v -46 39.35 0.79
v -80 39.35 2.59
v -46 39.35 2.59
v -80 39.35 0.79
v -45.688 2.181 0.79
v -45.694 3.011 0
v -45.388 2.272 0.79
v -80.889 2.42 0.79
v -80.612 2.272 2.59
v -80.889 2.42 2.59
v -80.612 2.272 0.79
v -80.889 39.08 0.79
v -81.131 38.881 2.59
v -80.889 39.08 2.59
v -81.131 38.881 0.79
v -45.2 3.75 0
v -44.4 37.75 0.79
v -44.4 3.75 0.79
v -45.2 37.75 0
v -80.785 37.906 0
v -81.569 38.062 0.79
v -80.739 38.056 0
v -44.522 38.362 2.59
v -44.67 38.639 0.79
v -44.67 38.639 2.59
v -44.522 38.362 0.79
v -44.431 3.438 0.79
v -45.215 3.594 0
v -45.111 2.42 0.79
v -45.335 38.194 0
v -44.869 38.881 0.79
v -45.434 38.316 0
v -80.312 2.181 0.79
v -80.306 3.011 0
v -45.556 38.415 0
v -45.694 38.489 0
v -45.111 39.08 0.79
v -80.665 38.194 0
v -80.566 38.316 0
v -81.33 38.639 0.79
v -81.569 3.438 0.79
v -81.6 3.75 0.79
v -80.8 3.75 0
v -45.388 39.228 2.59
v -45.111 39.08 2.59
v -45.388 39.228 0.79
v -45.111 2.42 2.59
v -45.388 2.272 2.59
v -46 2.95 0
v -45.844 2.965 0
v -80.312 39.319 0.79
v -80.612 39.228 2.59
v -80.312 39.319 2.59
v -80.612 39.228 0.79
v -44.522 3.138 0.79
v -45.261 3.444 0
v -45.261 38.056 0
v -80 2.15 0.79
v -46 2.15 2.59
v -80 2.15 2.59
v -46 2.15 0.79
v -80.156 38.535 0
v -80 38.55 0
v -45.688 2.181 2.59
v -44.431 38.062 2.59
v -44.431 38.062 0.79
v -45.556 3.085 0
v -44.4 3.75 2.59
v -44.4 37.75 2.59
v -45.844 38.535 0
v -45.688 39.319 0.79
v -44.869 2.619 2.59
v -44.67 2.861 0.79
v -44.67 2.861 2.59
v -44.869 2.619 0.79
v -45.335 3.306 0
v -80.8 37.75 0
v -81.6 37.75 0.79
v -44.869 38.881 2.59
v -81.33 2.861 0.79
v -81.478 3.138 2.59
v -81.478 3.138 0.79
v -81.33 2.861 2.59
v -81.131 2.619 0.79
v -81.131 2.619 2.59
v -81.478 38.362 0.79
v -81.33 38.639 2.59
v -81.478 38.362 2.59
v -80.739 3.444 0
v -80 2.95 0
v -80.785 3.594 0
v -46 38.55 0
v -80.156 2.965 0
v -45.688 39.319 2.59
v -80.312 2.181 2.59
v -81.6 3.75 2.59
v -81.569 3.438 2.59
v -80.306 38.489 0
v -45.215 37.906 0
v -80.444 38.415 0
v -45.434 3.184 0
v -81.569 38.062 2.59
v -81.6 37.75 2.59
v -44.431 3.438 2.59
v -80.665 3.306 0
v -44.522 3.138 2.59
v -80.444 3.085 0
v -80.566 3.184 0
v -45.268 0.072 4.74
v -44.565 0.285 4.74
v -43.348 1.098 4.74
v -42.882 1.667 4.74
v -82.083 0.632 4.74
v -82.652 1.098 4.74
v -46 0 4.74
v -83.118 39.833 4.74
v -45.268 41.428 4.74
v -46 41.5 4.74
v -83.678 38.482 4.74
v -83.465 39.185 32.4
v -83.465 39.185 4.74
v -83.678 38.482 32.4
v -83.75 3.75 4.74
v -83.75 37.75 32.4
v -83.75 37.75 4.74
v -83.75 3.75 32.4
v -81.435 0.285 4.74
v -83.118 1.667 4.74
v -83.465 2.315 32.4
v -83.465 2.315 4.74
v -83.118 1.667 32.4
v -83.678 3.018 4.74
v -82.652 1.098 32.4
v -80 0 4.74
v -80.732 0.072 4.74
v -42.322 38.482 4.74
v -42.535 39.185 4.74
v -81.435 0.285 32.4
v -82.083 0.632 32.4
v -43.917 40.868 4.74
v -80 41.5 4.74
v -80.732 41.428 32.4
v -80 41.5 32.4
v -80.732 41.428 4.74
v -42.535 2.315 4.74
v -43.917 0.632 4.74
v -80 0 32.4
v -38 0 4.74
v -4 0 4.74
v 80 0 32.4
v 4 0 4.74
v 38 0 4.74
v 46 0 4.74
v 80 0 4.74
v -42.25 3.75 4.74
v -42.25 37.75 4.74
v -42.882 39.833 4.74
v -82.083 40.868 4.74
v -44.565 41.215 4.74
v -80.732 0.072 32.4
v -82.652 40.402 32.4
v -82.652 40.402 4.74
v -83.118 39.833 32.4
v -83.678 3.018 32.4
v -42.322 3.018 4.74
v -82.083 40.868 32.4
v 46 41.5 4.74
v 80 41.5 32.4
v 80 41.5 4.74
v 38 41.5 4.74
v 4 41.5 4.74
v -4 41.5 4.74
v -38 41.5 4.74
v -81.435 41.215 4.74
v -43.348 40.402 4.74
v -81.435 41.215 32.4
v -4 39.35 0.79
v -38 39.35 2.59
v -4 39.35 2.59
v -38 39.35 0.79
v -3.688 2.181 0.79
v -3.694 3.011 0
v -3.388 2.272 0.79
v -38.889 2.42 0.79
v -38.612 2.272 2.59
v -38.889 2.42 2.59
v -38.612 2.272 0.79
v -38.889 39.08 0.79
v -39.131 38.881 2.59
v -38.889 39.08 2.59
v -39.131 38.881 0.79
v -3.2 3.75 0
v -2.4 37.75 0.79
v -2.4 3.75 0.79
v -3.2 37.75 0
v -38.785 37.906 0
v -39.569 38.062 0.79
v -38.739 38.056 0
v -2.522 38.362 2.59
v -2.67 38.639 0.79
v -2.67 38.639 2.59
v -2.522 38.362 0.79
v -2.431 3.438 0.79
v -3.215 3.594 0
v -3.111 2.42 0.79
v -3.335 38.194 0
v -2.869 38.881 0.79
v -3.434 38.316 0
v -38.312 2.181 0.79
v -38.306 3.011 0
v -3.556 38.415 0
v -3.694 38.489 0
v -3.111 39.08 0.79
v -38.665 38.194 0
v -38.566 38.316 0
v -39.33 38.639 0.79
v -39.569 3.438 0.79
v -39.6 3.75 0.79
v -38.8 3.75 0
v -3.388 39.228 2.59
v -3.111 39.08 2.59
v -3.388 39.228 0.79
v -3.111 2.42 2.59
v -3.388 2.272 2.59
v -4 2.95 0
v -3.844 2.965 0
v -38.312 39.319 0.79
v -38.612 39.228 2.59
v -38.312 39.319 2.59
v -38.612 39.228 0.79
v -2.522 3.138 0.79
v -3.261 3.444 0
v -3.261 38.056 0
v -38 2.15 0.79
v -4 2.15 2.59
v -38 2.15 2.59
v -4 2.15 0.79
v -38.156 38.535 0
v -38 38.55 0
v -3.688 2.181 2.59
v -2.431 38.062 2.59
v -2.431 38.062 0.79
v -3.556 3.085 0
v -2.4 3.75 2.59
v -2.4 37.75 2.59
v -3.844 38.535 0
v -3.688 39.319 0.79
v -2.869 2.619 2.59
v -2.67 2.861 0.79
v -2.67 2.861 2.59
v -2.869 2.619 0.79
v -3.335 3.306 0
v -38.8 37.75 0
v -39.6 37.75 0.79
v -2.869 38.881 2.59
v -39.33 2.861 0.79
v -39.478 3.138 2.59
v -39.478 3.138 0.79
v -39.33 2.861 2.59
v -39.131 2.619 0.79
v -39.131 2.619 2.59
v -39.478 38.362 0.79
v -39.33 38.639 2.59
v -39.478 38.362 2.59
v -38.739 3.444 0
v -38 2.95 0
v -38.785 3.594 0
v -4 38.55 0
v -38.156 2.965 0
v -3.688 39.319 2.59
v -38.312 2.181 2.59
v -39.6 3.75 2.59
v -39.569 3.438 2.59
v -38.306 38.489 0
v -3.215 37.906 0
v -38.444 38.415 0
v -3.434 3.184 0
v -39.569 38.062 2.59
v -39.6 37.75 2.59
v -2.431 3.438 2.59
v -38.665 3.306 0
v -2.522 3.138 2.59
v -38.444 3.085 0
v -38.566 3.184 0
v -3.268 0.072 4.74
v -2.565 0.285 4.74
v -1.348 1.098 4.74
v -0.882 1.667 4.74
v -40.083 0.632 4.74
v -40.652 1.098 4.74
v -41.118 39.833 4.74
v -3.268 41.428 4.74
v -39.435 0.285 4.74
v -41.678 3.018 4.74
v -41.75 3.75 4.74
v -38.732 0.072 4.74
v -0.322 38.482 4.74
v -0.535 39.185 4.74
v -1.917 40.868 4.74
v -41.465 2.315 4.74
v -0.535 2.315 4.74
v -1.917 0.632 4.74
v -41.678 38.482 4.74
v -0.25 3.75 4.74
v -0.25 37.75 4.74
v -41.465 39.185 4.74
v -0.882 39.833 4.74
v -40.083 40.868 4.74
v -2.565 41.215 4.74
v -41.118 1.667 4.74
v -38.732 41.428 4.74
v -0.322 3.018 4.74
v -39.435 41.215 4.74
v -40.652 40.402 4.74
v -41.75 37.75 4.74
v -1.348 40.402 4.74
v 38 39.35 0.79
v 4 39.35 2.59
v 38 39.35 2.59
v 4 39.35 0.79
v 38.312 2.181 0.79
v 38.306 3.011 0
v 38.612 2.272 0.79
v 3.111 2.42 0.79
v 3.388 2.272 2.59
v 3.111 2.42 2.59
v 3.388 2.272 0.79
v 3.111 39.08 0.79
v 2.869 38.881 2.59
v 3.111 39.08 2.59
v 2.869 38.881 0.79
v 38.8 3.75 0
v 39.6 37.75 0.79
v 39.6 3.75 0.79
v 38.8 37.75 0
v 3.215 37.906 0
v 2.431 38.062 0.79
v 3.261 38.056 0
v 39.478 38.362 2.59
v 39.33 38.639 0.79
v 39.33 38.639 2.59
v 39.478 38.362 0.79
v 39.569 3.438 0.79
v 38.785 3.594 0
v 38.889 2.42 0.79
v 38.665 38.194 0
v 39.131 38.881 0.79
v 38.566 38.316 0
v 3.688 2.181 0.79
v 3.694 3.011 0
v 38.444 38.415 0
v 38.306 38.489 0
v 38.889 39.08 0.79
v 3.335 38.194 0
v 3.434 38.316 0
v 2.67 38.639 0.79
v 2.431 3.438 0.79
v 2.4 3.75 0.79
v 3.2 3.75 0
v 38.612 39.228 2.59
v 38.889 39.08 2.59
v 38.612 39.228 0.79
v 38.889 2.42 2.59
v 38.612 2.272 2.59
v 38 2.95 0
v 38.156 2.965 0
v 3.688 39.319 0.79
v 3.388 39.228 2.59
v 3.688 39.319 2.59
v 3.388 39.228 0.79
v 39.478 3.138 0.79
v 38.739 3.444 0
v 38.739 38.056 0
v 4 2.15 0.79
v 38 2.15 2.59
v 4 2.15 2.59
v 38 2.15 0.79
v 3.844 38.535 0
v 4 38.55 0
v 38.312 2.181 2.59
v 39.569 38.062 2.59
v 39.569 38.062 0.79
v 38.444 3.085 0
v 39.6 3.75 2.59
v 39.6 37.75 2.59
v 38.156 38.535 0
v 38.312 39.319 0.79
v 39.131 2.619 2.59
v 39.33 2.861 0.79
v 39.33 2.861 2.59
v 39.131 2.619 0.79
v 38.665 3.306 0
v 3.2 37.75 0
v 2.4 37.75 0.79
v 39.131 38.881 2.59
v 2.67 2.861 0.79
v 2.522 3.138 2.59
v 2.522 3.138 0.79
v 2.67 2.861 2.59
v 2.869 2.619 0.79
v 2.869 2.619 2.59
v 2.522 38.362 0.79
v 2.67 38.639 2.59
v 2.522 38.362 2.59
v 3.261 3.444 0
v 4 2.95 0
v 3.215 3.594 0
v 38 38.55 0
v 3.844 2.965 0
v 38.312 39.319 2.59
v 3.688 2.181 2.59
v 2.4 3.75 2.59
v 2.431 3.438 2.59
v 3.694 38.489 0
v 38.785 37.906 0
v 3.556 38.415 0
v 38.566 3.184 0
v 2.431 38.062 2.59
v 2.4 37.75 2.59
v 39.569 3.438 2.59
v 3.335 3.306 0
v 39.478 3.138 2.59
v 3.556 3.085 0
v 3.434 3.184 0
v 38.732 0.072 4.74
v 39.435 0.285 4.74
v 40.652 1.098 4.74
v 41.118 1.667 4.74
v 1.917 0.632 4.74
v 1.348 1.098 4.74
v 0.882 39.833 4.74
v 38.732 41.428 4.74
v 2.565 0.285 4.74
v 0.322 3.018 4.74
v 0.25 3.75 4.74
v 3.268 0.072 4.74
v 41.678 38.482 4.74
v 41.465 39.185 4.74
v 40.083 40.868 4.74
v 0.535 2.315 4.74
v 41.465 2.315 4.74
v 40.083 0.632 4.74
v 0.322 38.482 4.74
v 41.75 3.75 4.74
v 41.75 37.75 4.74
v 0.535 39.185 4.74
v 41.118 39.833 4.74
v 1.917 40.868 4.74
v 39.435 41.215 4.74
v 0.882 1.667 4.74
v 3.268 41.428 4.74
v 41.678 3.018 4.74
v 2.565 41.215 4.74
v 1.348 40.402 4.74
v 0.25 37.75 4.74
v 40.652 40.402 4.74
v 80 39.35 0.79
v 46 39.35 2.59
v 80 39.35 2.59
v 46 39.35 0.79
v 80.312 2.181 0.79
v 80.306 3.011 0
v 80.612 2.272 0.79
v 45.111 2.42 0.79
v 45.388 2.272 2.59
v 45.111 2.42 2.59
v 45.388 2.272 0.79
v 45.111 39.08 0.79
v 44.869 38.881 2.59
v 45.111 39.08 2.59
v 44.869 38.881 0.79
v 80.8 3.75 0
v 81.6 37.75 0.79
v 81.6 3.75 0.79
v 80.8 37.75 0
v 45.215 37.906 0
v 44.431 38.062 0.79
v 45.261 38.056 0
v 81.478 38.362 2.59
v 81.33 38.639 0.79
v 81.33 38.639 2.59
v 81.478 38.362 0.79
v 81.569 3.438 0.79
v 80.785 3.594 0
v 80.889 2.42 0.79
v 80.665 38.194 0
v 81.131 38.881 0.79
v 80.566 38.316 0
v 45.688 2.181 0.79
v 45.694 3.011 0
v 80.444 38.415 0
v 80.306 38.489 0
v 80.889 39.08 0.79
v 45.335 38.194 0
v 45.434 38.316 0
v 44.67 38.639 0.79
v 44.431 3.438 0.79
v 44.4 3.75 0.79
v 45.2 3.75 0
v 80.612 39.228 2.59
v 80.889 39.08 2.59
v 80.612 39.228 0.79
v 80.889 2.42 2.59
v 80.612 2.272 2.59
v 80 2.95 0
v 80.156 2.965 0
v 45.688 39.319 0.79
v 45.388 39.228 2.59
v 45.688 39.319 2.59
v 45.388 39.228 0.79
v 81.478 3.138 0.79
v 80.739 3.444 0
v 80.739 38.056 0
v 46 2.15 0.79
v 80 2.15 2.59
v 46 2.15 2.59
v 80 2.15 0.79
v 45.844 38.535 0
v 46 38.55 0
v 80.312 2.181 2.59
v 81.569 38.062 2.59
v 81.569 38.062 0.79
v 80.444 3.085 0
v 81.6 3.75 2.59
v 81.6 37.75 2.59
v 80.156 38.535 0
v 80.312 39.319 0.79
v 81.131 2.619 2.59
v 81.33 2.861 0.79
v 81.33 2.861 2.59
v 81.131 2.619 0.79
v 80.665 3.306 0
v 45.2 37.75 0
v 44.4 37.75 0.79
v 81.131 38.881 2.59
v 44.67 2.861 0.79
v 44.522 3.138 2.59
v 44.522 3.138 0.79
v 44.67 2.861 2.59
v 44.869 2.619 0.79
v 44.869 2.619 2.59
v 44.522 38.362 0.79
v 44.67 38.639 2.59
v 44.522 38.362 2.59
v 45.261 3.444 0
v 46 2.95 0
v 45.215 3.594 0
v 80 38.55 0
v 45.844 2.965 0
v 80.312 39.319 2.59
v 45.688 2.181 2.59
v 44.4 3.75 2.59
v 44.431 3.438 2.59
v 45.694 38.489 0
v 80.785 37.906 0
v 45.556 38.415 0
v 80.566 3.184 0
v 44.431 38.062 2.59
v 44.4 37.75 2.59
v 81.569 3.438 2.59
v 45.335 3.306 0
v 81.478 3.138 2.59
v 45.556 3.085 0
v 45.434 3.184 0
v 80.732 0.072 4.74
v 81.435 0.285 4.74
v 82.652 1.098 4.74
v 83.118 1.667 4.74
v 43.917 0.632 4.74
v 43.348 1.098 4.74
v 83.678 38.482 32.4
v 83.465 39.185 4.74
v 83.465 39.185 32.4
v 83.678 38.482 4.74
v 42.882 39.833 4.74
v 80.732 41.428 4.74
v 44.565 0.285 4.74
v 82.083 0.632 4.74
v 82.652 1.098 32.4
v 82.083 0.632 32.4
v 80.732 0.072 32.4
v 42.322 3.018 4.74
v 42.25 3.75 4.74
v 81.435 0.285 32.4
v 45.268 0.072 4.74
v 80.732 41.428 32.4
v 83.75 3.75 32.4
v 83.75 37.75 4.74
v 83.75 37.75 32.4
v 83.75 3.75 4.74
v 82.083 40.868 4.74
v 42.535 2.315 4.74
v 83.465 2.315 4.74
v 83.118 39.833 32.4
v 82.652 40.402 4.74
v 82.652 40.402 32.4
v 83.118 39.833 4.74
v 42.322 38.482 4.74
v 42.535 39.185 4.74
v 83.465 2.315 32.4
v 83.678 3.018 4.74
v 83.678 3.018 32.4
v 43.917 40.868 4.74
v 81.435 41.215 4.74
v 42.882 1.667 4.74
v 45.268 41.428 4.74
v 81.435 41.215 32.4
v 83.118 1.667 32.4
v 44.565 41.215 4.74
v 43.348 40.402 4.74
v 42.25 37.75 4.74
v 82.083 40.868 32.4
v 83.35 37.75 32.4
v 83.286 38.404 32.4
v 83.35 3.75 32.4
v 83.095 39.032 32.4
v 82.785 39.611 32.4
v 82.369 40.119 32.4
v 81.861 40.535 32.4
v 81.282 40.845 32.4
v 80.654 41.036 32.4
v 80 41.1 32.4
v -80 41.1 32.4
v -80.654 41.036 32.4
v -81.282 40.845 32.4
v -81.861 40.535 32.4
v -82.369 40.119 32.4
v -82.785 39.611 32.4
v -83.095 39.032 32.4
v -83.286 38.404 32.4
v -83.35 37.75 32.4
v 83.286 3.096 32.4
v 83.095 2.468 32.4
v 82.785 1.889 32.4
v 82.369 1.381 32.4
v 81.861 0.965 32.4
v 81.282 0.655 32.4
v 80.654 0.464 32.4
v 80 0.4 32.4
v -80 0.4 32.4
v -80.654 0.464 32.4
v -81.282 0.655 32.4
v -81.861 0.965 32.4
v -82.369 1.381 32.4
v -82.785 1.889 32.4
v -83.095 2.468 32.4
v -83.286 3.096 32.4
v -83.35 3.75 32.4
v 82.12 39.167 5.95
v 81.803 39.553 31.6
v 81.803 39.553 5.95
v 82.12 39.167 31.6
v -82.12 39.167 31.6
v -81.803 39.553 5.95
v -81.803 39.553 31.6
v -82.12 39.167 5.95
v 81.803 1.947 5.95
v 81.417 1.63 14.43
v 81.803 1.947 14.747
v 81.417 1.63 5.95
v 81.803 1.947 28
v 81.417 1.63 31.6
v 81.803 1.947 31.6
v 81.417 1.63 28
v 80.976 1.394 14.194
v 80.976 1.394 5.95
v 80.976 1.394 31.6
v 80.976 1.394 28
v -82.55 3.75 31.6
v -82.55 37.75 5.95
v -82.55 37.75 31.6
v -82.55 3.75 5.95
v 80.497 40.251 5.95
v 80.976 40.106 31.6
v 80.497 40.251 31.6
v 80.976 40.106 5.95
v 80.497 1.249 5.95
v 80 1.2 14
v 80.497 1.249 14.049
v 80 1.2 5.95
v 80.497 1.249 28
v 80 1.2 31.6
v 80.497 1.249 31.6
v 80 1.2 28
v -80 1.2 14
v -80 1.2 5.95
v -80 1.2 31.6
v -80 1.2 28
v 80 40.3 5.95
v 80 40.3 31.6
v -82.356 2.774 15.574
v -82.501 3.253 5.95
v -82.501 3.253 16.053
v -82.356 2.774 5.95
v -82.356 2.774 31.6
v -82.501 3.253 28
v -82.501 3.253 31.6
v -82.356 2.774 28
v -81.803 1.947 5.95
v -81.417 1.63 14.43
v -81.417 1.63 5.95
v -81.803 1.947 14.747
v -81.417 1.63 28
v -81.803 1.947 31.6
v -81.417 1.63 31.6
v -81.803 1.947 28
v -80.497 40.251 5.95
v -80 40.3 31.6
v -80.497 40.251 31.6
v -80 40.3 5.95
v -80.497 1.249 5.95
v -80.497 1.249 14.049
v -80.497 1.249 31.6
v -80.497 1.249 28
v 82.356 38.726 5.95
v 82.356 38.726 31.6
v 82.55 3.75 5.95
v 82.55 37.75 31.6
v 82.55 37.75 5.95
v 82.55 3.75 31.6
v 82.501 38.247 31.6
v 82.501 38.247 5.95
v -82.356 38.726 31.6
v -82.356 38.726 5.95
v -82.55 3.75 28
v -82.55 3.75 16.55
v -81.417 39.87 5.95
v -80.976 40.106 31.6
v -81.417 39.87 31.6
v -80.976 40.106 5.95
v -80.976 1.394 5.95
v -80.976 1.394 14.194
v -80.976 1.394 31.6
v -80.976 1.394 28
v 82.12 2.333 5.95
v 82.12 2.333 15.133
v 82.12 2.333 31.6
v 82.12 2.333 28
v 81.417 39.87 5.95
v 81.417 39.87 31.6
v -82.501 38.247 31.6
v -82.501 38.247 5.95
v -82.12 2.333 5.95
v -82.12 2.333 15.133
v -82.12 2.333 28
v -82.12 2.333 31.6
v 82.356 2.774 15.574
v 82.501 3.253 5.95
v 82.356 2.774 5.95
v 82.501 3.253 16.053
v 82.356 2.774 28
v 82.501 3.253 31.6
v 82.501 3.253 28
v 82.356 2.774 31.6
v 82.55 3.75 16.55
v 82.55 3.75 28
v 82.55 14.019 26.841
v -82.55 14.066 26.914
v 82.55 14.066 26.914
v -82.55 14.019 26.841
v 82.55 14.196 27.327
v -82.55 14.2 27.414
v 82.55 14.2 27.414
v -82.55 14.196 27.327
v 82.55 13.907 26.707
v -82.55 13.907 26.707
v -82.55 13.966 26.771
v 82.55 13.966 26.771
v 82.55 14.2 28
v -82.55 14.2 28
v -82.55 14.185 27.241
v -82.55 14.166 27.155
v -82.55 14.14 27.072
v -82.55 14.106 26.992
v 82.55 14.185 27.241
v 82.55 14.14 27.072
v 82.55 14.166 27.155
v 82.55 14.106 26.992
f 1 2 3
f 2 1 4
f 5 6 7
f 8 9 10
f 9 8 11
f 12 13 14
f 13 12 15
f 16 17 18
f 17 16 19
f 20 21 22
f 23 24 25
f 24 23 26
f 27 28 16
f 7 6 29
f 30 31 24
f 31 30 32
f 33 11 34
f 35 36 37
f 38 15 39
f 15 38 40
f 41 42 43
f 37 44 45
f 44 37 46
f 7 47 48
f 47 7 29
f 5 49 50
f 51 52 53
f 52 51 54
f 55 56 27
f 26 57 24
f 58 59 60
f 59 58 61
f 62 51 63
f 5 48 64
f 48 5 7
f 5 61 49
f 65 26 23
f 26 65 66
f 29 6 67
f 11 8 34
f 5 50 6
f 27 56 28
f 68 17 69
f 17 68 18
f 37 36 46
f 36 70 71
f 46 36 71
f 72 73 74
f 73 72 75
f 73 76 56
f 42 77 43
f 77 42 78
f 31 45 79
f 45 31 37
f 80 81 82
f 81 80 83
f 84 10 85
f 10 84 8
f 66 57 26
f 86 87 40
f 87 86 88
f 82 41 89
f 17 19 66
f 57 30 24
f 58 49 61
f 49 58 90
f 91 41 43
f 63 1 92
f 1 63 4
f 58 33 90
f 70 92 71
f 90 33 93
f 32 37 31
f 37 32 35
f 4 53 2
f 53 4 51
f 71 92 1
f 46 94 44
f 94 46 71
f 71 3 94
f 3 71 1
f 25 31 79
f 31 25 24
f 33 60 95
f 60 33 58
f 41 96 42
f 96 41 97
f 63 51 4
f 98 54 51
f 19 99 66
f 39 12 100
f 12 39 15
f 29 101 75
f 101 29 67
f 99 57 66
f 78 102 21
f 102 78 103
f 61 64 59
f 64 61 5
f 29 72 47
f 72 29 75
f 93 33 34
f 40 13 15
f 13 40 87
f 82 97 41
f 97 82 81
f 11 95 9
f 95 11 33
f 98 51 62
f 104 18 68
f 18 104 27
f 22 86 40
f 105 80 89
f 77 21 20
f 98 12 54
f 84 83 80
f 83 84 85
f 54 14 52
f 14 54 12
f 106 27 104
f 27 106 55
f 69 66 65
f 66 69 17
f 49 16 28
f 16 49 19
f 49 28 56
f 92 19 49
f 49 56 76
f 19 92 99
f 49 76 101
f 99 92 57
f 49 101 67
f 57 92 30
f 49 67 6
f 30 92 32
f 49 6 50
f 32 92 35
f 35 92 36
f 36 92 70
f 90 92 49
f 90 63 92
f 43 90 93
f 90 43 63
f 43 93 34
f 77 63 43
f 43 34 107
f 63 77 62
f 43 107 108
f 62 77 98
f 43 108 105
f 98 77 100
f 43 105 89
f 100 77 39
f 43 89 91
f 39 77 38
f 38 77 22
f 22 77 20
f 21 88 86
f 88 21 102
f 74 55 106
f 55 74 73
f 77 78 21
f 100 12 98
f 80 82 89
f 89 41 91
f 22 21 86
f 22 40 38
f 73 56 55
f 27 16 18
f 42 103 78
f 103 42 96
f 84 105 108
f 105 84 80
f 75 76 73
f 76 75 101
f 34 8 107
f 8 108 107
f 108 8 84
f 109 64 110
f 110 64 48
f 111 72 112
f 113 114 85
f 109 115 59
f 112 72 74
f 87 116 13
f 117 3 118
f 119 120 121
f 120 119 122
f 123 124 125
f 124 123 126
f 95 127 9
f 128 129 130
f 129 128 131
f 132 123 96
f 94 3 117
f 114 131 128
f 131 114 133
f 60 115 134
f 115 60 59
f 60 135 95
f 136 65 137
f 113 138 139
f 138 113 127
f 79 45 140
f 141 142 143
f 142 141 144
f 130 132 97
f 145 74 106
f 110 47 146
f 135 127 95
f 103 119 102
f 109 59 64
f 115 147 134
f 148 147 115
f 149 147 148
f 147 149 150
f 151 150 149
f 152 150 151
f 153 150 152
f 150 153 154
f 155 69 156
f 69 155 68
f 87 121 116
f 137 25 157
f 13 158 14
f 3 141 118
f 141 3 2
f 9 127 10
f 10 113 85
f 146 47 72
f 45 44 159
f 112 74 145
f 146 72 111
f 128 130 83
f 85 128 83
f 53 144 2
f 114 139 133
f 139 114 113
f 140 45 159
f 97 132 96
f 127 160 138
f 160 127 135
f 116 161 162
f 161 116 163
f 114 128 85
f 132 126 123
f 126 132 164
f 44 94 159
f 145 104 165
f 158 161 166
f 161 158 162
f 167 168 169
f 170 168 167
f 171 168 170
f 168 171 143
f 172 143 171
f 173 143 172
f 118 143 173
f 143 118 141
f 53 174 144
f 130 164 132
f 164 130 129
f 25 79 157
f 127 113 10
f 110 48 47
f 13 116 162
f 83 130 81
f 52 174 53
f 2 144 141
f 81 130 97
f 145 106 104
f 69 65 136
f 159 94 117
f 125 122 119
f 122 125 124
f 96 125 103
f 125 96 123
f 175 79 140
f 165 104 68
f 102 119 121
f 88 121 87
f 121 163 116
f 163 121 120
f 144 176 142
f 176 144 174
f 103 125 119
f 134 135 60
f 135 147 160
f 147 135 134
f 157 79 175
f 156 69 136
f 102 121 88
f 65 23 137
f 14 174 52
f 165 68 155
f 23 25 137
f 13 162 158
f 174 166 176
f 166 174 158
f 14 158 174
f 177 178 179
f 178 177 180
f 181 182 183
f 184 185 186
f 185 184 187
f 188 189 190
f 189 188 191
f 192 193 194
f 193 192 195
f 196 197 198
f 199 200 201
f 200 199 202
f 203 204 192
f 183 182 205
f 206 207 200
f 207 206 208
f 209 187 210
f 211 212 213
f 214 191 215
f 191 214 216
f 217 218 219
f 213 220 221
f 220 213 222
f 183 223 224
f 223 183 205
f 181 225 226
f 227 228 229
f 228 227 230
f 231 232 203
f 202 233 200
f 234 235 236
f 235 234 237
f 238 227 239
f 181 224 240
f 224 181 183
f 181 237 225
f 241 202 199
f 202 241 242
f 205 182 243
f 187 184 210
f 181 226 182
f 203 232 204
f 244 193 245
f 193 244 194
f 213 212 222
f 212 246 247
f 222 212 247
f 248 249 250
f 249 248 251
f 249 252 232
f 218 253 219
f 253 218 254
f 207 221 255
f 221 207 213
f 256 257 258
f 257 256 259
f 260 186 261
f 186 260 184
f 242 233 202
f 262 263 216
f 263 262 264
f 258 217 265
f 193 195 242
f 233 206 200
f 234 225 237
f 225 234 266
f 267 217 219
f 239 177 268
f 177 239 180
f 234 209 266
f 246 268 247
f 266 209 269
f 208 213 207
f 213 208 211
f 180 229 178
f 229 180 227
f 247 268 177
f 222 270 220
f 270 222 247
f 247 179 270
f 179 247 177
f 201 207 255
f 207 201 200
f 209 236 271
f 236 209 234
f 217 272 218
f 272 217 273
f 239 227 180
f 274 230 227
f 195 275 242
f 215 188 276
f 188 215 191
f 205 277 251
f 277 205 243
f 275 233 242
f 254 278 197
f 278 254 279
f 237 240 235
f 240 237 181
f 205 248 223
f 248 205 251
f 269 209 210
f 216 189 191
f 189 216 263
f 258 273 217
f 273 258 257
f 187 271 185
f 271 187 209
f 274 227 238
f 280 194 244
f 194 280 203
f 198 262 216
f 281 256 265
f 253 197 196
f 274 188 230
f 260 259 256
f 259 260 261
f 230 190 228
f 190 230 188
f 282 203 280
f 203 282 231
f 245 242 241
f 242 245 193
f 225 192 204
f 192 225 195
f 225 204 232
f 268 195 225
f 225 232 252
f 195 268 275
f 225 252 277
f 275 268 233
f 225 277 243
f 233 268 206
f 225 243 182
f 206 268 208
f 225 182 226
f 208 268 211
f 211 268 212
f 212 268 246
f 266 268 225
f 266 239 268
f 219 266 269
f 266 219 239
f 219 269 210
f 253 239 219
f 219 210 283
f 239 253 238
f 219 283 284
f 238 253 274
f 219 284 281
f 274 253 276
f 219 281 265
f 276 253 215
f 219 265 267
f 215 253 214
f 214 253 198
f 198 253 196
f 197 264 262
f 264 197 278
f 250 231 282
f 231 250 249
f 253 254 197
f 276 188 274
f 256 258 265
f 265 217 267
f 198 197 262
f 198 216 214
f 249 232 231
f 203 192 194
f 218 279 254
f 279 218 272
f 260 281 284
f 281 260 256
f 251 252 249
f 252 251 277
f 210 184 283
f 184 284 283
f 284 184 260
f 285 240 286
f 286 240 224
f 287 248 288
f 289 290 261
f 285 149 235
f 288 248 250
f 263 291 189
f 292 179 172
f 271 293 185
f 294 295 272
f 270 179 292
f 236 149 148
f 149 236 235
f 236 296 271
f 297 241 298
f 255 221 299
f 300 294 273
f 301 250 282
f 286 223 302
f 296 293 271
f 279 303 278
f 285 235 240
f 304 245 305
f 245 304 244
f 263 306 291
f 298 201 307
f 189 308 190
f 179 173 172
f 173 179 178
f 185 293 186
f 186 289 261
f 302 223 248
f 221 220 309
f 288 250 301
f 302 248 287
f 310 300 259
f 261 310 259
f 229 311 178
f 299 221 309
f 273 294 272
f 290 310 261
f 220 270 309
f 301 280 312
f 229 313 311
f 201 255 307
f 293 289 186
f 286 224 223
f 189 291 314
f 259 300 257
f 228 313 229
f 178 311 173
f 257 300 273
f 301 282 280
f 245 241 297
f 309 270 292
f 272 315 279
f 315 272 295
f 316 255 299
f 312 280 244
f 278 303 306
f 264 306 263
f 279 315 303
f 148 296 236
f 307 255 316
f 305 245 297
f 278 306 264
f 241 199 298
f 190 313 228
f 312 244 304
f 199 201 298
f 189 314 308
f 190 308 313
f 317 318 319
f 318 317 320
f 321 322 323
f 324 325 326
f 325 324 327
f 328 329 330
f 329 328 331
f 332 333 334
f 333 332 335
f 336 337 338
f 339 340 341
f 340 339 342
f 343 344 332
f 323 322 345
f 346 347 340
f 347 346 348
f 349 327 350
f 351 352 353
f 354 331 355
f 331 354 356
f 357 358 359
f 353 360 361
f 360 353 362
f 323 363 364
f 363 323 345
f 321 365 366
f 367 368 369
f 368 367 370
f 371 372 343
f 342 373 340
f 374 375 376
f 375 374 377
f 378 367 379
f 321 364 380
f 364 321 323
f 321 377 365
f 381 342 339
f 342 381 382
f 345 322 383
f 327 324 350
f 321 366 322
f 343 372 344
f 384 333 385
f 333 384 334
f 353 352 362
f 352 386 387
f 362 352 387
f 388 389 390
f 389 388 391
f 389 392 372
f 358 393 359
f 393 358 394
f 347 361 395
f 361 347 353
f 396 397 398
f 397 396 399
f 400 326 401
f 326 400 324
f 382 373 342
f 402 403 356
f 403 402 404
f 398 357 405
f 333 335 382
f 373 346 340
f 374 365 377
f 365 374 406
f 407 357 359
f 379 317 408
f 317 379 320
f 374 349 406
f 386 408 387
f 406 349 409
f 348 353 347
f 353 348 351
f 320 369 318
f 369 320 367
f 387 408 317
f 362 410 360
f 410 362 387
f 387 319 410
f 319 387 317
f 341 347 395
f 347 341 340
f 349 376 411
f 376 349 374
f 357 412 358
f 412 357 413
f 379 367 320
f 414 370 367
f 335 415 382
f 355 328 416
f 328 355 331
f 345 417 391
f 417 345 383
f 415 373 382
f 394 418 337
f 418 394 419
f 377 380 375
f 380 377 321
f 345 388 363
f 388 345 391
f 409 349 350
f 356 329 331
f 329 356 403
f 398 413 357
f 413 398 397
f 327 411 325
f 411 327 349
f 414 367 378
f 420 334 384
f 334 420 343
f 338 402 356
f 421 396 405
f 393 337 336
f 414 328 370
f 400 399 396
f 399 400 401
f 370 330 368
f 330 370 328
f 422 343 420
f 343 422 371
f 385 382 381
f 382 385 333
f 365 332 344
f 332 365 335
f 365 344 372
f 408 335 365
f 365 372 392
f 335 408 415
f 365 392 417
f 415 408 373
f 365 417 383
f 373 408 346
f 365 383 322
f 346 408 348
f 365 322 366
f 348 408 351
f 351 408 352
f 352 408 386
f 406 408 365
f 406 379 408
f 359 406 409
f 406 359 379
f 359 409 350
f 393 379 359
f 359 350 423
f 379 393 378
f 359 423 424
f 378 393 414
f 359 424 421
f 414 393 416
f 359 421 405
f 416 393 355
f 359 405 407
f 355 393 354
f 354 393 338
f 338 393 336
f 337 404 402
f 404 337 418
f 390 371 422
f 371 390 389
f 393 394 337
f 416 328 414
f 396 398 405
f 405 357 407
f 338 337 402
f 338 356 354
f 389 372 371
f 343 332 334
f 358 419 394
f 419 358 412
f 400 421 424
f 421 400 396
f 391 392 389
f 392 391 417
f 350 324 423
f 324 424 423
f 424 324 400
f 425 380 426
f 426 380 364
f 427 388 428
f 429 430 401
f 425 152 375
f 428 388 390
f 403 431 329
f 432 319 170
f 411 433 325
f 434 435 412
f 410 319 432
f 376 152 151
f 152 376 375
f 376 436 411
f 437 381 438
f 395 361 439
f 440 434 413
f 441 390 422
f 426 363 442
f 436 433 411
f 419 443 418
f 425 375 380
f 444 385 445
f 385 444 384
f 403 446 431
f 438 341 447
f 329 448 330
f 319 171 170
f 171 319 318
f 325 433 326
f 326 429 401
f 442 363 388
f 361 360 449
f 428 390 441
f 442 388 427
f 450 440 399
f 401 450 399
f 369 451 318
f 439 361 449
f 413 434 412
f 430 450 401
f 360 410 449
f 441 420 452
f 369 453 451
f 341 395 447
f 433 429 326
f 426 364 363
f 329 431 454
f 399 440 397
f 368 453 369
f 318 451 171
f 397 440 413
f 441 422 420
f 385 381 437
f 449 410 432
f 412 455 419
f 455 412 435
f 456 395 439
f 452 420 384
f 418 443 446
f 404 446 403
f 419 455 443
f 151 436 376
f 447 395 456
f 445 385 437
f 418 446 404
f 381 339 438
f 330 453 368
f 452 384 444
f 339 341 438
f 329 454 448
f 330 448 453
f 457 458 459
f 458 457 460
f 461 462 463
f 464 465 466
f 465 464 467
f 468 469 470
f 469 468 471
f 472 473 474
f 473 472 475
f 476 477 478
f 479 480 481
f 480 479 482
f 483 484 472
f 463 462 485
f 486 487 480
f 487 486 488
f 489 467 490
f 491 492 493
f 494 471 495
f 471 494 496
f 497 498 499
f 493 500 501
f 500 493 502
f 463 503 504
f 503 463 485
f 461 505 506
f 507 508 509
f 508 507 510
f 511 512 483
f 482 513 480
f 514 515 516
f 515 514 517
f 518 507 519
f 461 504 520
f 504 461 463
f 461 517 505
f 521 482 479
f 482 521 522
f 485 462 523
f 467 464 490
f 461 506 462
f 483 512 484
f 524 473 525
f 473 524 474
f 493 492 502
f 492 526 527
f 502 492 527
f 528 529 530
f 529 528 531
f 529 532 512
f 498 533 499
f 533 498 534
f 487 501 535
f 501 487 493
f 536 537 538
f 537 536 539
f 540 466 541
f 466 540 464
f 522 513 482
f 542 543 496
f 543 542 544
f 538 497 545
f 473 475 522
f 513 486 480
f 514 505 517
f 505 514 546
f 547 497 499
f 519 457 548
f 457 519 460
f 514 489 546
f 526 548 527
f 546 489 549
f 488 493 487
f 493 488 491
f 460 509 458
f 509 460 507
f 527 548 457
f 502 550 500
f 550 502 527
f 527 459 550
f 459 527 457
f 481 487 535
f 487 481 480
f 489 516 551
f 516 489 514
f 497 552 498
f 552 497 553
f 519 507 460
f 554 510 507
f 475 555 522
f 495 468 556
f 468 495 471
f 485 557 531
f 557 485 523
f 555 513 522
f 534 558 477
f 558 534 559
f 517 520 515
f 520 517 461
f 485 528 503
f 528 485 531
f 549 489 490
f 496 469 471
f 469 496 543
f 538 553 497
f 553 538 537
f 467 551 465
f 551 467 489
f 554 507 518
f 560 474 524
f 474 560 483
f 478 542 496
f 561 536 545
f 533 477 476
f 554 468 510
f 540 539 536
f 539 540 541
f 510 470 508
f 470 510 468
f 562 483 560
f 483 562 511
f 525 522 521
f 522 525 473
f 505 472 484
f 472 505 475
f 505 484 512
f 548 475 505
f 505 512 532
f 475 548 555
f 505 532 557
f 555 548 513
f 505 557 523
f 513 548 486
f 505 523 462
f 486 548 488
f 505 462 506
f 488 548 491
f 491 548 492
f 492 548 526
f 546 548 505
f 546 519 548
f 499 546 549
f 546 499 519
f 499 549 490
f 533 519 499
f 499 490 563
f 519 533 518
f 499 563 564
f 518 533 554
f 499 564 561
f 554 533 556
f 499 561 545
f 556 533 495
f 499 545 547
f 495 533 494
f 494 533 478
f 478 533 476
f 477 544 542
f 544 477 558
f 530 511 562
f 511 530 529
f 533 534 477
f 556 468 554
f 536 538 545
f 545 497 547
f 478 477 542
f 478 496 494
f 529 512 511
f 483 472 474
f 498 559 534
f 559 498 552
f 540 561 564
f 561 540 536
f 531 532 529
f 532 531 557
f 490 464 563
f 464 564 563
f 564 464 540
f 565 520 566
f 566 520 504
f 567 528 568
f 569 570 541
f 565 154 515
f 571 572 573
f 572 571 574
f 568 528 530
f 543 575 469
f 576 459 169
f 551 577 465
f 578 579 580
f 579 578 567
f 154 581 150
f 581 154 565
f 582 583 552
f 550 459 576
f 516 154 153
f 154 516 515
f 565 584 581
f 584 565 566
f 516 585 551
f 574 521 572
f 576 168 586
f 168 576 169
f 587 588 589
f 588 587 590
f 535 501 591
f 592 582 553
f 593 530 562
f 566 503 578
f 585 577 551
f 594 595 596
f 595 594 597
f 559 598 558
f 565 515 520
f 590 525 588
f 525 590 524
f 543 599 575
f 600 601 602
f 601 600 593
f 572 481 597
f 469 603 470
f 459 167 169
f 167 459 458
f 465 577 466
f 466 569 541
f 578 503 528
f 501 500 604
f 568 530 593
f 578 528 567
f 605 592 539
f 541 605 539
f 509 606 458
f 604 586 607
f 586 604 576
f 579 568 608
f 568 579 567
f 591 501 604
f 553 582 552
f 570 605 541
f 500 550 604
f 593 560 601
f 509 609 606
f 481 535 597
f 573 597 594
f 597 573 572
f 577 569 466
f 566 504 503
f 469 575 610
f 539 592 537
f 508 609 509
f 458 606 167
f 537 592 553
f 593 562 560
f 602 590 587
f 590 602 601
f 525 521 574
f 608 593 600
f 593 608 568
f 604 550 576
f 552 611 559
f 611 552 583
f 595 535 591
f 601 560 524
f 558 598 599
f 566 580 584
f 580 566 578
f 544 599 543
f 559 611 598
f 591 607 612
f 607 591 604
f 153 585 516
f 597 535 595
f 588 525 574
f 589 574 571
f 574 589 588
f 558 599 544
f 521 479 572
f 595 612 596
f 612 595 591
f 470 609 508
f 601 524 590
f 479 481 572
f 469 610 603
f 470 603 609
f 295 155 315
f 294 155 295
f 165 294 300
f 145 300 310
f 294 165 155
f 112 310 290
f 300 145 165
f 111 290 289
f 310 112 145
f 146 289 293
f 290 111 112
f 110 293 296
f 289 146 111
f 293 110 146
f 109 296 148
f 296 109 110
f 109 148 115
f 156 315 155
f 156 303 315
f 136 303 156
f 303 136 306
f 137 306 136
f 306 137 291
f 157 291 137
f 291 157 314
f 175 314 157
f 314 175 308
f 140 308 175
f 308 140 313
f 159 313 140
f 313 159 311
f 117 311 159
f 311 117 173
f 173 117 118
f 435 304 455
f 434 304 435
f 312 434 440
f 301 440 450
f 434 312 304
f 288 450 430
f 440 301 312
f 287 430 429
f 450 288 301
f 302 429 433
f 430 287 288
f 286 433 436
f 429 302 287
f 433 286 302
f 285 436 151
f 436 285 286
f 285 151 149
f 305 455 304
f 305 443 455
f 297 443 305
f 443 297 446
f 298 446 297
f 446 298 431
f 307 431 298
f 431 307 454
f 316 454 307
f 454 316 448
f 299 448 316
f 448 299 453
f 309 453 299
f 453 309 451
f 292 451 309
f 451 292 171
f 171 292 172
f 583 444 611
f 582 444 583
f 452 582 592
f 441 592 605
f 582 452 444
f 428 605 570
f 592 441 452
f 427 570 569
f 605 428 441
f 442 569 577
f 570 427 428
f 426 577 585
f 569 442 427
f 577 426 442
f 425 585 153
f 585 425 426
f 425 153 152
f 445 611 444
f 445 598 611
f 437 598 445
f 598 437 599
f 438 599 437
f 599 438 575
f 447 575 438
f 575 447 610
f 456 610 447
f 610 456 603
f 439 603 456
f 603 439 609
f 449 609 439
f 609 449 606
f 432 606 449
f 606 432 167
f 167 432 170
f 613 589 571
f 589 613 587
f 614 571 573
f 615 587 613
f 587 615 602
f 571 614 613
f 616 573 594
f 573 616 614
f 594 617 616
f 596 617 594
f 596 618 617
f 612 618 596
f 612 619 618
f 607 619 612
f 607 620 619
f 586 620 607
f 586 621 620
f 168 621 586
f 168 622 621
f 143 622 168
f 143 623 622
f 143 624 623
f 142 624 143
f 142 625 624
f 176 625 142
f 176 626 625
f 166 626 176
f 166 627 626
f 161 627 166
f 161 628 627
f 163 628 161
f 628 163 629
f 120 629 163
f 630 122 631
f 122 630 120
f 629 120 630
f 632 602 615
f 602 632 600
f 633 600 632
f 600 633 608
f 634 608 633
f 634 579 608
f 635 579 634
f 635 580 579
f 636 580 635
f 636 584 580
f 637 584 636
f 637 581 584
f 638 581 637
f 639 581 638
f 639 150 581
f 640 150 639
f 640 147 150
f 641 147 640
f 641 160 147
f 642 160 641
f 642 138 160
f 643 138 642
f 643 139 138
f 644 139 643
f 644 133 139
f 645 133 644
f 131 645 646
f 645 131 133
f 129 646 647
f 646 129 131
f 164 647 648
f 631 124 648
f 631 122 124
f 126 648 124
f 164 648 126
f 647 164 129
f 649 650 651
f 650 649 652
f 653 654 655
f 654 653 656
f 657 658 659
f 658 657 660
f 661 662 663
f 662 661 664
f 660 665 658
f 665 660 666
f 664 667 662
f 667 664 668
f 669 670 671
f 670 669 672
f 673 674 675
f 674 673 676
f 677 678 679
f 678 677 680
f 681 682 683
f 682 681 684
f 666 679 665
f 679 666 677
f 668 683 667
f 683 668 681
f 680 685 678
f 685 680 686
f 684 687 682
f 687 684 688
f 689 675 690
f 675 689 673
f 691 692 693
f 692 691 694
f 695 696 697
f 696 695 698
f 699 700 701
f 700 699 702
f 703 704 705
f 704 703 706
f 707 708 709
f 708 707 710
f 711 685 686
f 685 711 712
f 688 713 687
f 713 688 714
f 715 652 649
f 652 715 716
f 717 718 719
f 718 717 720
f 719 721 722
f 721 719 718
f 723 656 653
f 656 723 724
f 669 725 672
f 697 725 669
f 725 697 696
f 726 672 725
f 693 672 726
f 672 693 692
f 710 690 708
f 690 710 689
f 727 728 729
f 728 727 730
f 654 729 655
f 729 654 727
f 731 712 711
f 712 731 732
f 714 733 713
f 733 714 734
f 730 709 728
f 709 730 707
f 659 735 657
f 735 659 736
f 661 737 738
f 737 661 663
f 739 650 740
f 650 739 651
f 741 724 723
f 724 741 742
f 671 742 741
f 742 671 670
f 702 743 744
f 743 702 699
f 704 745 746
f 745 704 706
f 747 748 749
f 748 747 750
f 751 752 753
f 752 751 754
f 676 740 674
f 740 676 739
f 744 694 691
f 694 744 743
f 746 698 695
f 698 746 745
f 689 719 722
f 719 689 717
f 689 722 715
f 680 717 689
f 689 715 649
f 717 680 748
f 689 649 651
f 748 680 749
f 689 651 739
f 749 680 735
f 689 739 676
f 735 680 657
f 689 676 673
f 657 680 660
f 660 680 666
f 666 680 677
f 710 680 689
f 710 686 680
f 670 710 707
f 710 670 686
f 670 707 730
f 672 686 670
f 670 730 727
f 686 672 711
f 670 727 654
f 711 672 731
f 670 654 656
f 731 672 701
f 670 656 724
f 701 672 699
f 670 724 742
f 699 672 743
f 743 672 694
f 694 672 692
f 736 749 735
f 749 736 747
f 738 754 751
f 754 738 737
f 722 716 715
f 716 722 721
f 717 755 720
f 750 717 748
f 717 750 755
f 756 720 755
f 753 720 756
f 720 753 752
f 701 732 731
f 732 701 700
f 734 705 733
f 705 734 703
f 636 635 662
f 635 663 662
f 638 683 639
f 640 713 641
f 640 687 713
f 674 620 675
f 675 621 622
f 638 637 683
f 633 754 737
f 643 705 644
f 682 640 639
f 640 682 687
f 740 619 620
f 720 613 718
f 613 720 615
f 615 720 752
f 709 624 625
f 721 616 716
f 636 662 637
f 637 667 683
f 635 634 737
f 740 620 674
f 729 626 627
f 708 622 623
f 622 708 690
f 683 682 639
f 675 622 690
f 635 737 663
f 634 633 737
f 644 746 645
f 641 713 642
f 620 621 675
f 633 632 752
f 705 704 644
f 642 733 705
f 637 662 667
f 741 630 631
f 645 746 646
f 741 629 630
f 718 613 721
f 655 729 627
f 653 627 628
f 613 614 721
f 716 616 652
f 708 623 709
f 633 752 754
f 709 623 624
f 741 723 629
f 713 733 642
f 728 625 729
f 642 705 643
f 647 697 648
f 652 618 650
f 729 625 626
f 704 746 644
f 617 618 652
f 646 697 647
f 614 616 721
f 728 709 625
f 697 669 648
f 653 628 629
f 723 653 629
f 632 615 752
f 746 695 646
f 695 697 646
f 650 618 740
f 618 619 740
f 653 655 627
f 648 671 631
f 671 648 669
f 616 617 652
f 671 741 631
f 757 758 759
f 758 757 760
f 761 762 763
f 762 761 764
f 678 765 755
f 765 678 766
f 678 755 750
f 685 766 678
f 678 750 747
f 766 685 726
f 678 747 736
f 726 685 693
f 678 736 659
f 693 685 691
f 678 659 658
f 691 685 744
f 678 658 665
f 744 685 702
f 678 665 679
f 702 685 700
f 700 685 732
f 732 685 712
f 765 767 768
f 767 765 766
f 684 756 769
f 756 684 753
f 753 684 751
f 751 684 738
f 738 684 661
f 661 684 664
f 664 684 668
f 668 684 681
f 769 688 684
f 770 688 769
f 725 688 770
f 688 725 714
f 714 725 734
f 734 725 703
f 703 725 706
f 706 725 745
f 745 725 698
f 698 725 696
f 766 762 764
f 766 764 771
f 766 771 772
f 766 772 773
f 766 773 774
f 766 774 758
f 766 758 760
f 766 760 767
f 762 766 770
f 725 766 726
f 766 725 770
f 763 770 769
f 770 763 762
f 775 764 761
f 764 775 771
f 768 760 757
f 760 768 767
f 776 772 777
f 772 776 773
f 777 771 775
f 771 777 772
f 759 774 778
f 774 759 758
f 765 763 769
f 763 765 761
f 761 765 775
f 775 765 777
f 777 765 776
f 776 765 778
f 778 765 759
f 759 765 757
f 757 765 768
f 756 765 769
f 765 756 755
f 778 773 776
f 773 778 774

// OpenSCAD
// file: ../../modules/gridfinity.scad
// Gridfinity ベースプレートの共有 module。
// 寸法は Gridfinity 仕様 (Zack Freedman) の baseplate 輪郭に従う:
//   ピッチ 42、ソケット上端開口 41.5 (角 R4)、上から 45° 面取り 2.15 →
//   垂直 1.8 (37.2 角・R1.85) → 45° 面取り 0.7 → 底 35.8 角 (R1.15)。
//   ソケット深さ = 2.15 + 1.8 + 0.7 = 4.65。
//
// 座標系: X が列方向 (中央が 0)、Y が行方向 (板の前端が 0)、Z=0 が板の底面。
// 板の外形は grid とは独立に rim で与えるので、grid より大きい板 (縁付き) を
// 作れる。ソケットは rim=[left, right, front, back] の内側へ 42 ピッチで並ぶ。

gf_pitch = 42;
gf_socket_top = 41.5; // 上端開口
gf_socket_mid = 37.2; // 垂直部
gf_socket_bot = 35.8; // 底
gf_socket_r_top = 4;
gf_socket_r_mid = 1.85;
gf_socket_r_bot = 1.15;
gf_chamfer_top = 2.15;
gf_wall_h = 1.8;
gf_chamfer_bot = 0.7;
gf_socket_depth = gf_chamfer_top + gf_wall_h + gf_chamfer_bot; // 4.65
gf_fn = 32;
gf_eps = 0.01; // hull 用の薄板の厚さ
gf_over = 0.5; // 切削の抜き代

// 角丸正方形 (一辺 w、角 R)
module
gf_rounded_square(w, r)
{
    offset(r = r, $fn = gf_fn) square(w - 2 * r, center = true);
}

// 厚さ gf_eps の角丸正方形の薄板を z に置く (hull の骨)
module
gf_slab(w, r, z)
{
    translate([ 0, 0, z ]) linear_extrude(gf_eps) gf_rounded_square(w, r);
}

// ソケット1個の切削体。z=0 がソケットの底 (床の天面)、+Z へ 4.65 で天面に出る。
// clearance は嵌合の逃げで、輪郭を全周へ clearance だけ外へ出す (幅 +2c、角 R
// +c)。 既定 0 が Gridfinity の公称輪郭。深さとピッチは変えない
module
gf_socket_cut(clearance = 0)
{
    z1 = gf_chamfer_bot;
    z2 = z1 + gf_wall_h;
    z3 = gf_socket_depth;
    c = clearance;
    hull()
    {
        gf_slab(gf_socket_bot + 2 * c, gf_socket_r_bot + c, 0);
        gf_slab(gf_socket_mid + 2 * c, gf_socket_r_mid + c, z1 - gf_eps);
    }
    hull()
    {
        gf_slab(gf_socket_mid + 2 * c, gf_socket_r_mid + c, z1 - gf_eps);
        gf_slab(gf_socket_mid + 2 * c, gf_socket_r_mid + c, z2 - gf_eps);
    }
    hull()
    {
        gf_slab(gf_socket_mid + 2 * c, gf_socket_r_mid + c, z2 - gf_eps);
        gf_slab(gf_socket_top + 2 * c, gf_socket_r_top + c, z3 - gf_eps);
    }
    // 天面より上へ抜く (天面と同一平面の退化した面を残さない)
    gf_slab(gf_socket_top + 2 * c, gf_socket_r_top + c, z3 - gf_eps);
    translate([ 0, 0, z3 - gf_eps ]) linear_extrude(gf_over + gf_eps)
        gf_rounded_square(gf_socket_top + 2 * c, gf_socket_r_top + c);
}

// ベースプレート。cols x rows のソケットを床 floor_t の上に彫る。
// rim = [left, right, front, back] はソケット列の外側に残す縁の幅。
// 板の幅 = cols*42 + left + right、奥行き = rows*42 + front + back。
// clearance はソケットの嵌合の逃げ (gf_socket_cut を参照)。
module
gf_baseplate(cols, rows, rim = [ 0, 0, 0, 0 ], floor_t = 1, clearance = 0)
{
    grid_w = cols * gf_pitch;
    grid_d = rows * gf_pitch;
    plate_w = grid_w + rim[0] + rim[1];
    plate_d = grid_d + rim[2] + rim[3];
    x0 = -plate_w / 2 + rim[0]; // ソケット列の左端
    difference()
    {
        translate([ -plate_w / 2, 0, 0 ])
            cube([ plate_w, plate_d, floor_t + gf_socket_depth ]);
        for (c = [0:cols - 1], r = [0:rows - 1])
            translate([
                x0 + (c + 0.5) * gf_pitch,
                rim[2] + (r + 0.5) * gf_pitch,
                floor_t
            ]) gf_socket_cut(clearance);
    }
}
// file: ../../modules/gridfinity_bin.scad
include <gridfinity.scad>

// Gridfinity bin (箱) の共有 module。ピッチと角丸は gridfinity.scad
// と共有する。 底の輪郭は Gridfinity 仕様の bin base (下から):
//   35.6 角 (R0.8) → 45° 0.8 → 37.2 角 (R1.6) → 垂直 1.8 → 45° 2.15 → 41.5 角
//   (R3.75) 高さ 0.8 + 1.8 + 2.15 = 4.75。磁石穴・ネジ穴は持たない (無垢)
// 外形はピッチ − 0.5 (1 マス 41.5)、角 R3.75。高さ単位 7 (4U = 28 が壁の上端)。
// リップは「薄いリップ」: 壁 (1.2) をそのまま lip_h (4.4) 伸ばし、内側の上端を
// 45° に落とすだけ。内側に棚 (厚い肉) を持たないので、上に載せる bin は底の
// 面取りをこの 45° に座らせる。
//
// 座標系: X が列方向 (中央 0)、Y が行方向 (手前 = ラベル側が 0)、Z=0 が底面。

gfb_outer = gf_pitch - 0.5; // 41.5
gfb_outer_r = 3.75;
gfb_base_bot = 35.6;
gfb_base_bot_r = 0.8;
gfb_base_mid = 37.2;
gfb_base_mid_r = 1.6;
gfb_base_chamfer_bot = 0.8;
gfb_base_wall_h = 1.8;
gfb_base_chamfer_top = 2.15;
gfb_base_h =
    gfb_base_chamfer_bot + gfb_base_wall_h + gfb_base_chamfer_top; // 4.75
gfb_unit = 7;
gfb_lip_h = 4.4;
gfb_lip_chamfer = 0.8;

// bin 1 マスぶんの底 (無垢)。z=0 が底面、gfb_base_h で外形 41.5 角に達する
module
gfb_base_cell()
{
    z1 = gfb_base_chamfer_bot;
    z2 = z1 + gfb_base_wall_h;
    z3 = gfb_base_h;
    hull()
    {
        gf_slab(gfb_base_bot, gfb_base_bot_r, 0);
        gf_slab(gfb_base_mid, gfb_base_mid_r, z1 - gf_eps);
    }
    hull()
    {
        gf_slab(gfb_base_mid, gfb_base_mid_r, z1 - gf_eps);
        gf_slab(gfb_base_mid, gfb_base_mid_r, z2 - gf_eps);
    }
    hull()
    {
        gf_slab(gfb_base_mid, gfb_base_mid_r, z2 - gf_eps);
        gf_slab(gfb_outer, gfb_outer_r, z3 - gf_eps);
    }
}

// cols x rows の角丸矩形 (外形)
module
gfb_footprint(cols, rows, inset = 0)
{
    w = cols * gf_pitch - 0.5 - 2 * inset;
    d = rows * gf_pitch - 0.5 - 2 * inset;
    translate([ 0, d / 2 + inset ])
        gf_rounded_square_wd(w, d, gfb_outer_r - inset);
}

// 幅 w × 奥行き d の角丸矩形 (中心が原点)
module
gf_rounded_square_wd(w, d, r)
{
    offset(r = r, $fn = gf_fn) square([ w - 2 * r, d - 2 * r ], center = true);
}

// ラベル天板の Y-Z 断面 (y = 壁の内面からの距離、z = 高さ)。天板 (厚さ t) の
// 先端から 45° の斜面が壁まで下りる無垢のくさび。先端の垂直面と斜面の境目
// (135°) を半径 r で丸める: 円弧の中心は先端の角から (-r, r·tan22.5°)、接点は
// 垂直面上の角 + (0, r·tan22.5°) と斜面上の角 + 0.4142r·(-1,-1)。壁の内側へ
// 1 だけ食い込ませて胴体と溶かす
function gfb_label_profile(d, t, h, r) =
    let(y0 = d, z0 = h - t, cy = y0 - r, cz = z0 + r * tan(22.5))
        concat([ [ -1, h ], [ d, h ] ],
               [for (a = [0:-5:-45])[cy + r * cos(a), cz + r* sin(a)]],
               [[ -1, h - t - d - 1 ]]);

// bin 本体。units は高さ (U)。wall / floor_t は壁と床の厚さ。
// label_d > 0 なら手前 (y=0) の壁の上端 (z = units*7) と面一で内側へ label_d
// 張り出す厚さ label_t のラベル天板を付ける。天板の下は 45° の無垢のくさびが
// 壁まで下りる (ブリッジもリブも無い。中身はスライサのインフィル任せ)。
// 天板の先端と 45° 面の境目は半径 label_r で丸める
module
gfb_bin(cols,
        rows,
        units = 4,
        wall = 1.2,
        floor_t = 1.2,
        label_d = 0,
        label_t = 1,
        label_r = 1)
{
    h = units * gfb_unit; // 壁の上端
    top = h + gfb_lip_h;  // リップの上端
    inner_w = cols * gf_pitch - 0.5 - 2 * wall;
    floor_top = gfb_base_h + floor_t;
    union()
    {
        // 底: マスごとの無垢の base
        for (c = [0:cols - 1], r = [0:rows - 1])
            translate([
                (c - (cols - 1) / 2) * gf_pitch,
                (r + 0.5) * gf_pitch - 0.25,
                0
            ]) gfb_base_cell();
        // 胴体: base の上から top
        // まで。内側は床の上を抜く。リップの内側の上端は 45°
        difference()
        {
            translate([ 0, 0, gfb_base_h - gf_eps ])
                linear_extrude(top - gfb_base_h + gf_eps)
                    gfb_footprint(cols, rows);
            translate([ 0, 0, floor_top ])
                linear_extrude(top - floor_top + gf_over)
                    gfb_footprint(cols, rows, wall);
            // リップ内側の面取り: 上端で wall − 0.4 まで開く
            hull()
            {
                translate([ 0, 0, top - gfb_lip_chamfer ])
                    linear_extrude(gf_eps) gfb_footprint(cols, rows, wall);
                translate([ 0, 0, top ]) linear_extrude(gf_over)
                    gfb_footprint(cols, rows, wall - gfb_lip_chamfer);
            }
        }
        // ラベル天板と 45° くさび (内幅いっぱい、同じ断面)。壁へ 1 食い込ませた
        // 矩形の柱なので、角の丸み (R3.75) の外へ出ないよう外形で切り取る
        if (label_d > 0)
            intersection()
            {
                translate([ -inner_w / 2, wall, 0 ]) rotate([ 90, 0, 90 ])
                    linear_extrude(inner_w) polygon(
                        gfb_label_profile(label_d, label_t, h, label_r));
                linear_extrude(top) gfb_footprint(cols, rows);
            }
    }
}
// file: ../../modules/gridfinity_bin_4u.scad
include <gridfinity_bin.scad>

// assets/gridfinity-bin/ の bin 群の共通値と、サイズ 3 引数の払い出し口。
// 単体では何も描かない。設計の経緯と確定値は
// ledger/designs/gridfinity-bin-4u.md が正本。 保証する範囲は cols 1..5 ×
// rows 1..5 × units 4 (assets に並ぶ 25 種)。 cols が X (横)、rows が Y
// (ラベルの壁から奥へ)、units が高さ (7mm 単位)。
wall = 1.2;    // 0.4 ノズル 3 本
floor_t = 1.2; // 底 (4.75) の上に載せる床。床の天面 z = 5.95
label_d = 13;  // 12mm 幅のラベルシールを貼る天板の張り出し
label_t = 1; // 天板の厚さ (user 指定)。下は 45° の無垢のくさび
label_r = 1; // 天板の先端と 45° 面の境目の R (user 指定)

function bin_contract(cols, rows, units) = str("CONTRACT units=",
                                               units,
                                               " pitch=",
                                               gf_pitch,
                                               " outer=",
                                               gfb_outer,
                                               " h=",
                                               units* gfb_unit,
                                               " lip=",
                                               gfb_lip_h,
                                               " base=",
                                               gfb_base_bot,
                                               "/",
                                               gfb_base_mid,
                                               "/",
                                               gfb_outer,
                                               " base_h=",
                                               gfb_base_h,
                                               " wall=",
                                               wall,
                                               " floor_top=",
                                               gfb_base_h + floor_t,
                                               " label=",
                                               label_d,
                                               "x",
                                               label_t,
                                               " wedge=45 fillet=",
                                               label_r,
                                               " bin=",
                                               cols,
                                               "x",
                                               rows,
                                               " size=",
                                               cols* gf_pitch - 0.5,
                                               "x",
                                               rows* gf_pitch - 0.5);

// (cols, rows, units) でラベル付き bin を払い出す。例: gridfinity_bin(2, 4, 4)
module
gridfinity_bin(cols, rows, units = 4)
{
    echo(bin_contract(cols, rows, units));
    gfb_bin(cols, rows, units, wall, floor_t, label_d, label_t, label_r);
}
// main file
include <../../modules/gridfinity_bin_4u.scad>

// 4x1 マス、高さ 4U のラベル天板付き bin。ラベルは手前 (y=0) 側
gridfinity_bin(4, 1, 4);
